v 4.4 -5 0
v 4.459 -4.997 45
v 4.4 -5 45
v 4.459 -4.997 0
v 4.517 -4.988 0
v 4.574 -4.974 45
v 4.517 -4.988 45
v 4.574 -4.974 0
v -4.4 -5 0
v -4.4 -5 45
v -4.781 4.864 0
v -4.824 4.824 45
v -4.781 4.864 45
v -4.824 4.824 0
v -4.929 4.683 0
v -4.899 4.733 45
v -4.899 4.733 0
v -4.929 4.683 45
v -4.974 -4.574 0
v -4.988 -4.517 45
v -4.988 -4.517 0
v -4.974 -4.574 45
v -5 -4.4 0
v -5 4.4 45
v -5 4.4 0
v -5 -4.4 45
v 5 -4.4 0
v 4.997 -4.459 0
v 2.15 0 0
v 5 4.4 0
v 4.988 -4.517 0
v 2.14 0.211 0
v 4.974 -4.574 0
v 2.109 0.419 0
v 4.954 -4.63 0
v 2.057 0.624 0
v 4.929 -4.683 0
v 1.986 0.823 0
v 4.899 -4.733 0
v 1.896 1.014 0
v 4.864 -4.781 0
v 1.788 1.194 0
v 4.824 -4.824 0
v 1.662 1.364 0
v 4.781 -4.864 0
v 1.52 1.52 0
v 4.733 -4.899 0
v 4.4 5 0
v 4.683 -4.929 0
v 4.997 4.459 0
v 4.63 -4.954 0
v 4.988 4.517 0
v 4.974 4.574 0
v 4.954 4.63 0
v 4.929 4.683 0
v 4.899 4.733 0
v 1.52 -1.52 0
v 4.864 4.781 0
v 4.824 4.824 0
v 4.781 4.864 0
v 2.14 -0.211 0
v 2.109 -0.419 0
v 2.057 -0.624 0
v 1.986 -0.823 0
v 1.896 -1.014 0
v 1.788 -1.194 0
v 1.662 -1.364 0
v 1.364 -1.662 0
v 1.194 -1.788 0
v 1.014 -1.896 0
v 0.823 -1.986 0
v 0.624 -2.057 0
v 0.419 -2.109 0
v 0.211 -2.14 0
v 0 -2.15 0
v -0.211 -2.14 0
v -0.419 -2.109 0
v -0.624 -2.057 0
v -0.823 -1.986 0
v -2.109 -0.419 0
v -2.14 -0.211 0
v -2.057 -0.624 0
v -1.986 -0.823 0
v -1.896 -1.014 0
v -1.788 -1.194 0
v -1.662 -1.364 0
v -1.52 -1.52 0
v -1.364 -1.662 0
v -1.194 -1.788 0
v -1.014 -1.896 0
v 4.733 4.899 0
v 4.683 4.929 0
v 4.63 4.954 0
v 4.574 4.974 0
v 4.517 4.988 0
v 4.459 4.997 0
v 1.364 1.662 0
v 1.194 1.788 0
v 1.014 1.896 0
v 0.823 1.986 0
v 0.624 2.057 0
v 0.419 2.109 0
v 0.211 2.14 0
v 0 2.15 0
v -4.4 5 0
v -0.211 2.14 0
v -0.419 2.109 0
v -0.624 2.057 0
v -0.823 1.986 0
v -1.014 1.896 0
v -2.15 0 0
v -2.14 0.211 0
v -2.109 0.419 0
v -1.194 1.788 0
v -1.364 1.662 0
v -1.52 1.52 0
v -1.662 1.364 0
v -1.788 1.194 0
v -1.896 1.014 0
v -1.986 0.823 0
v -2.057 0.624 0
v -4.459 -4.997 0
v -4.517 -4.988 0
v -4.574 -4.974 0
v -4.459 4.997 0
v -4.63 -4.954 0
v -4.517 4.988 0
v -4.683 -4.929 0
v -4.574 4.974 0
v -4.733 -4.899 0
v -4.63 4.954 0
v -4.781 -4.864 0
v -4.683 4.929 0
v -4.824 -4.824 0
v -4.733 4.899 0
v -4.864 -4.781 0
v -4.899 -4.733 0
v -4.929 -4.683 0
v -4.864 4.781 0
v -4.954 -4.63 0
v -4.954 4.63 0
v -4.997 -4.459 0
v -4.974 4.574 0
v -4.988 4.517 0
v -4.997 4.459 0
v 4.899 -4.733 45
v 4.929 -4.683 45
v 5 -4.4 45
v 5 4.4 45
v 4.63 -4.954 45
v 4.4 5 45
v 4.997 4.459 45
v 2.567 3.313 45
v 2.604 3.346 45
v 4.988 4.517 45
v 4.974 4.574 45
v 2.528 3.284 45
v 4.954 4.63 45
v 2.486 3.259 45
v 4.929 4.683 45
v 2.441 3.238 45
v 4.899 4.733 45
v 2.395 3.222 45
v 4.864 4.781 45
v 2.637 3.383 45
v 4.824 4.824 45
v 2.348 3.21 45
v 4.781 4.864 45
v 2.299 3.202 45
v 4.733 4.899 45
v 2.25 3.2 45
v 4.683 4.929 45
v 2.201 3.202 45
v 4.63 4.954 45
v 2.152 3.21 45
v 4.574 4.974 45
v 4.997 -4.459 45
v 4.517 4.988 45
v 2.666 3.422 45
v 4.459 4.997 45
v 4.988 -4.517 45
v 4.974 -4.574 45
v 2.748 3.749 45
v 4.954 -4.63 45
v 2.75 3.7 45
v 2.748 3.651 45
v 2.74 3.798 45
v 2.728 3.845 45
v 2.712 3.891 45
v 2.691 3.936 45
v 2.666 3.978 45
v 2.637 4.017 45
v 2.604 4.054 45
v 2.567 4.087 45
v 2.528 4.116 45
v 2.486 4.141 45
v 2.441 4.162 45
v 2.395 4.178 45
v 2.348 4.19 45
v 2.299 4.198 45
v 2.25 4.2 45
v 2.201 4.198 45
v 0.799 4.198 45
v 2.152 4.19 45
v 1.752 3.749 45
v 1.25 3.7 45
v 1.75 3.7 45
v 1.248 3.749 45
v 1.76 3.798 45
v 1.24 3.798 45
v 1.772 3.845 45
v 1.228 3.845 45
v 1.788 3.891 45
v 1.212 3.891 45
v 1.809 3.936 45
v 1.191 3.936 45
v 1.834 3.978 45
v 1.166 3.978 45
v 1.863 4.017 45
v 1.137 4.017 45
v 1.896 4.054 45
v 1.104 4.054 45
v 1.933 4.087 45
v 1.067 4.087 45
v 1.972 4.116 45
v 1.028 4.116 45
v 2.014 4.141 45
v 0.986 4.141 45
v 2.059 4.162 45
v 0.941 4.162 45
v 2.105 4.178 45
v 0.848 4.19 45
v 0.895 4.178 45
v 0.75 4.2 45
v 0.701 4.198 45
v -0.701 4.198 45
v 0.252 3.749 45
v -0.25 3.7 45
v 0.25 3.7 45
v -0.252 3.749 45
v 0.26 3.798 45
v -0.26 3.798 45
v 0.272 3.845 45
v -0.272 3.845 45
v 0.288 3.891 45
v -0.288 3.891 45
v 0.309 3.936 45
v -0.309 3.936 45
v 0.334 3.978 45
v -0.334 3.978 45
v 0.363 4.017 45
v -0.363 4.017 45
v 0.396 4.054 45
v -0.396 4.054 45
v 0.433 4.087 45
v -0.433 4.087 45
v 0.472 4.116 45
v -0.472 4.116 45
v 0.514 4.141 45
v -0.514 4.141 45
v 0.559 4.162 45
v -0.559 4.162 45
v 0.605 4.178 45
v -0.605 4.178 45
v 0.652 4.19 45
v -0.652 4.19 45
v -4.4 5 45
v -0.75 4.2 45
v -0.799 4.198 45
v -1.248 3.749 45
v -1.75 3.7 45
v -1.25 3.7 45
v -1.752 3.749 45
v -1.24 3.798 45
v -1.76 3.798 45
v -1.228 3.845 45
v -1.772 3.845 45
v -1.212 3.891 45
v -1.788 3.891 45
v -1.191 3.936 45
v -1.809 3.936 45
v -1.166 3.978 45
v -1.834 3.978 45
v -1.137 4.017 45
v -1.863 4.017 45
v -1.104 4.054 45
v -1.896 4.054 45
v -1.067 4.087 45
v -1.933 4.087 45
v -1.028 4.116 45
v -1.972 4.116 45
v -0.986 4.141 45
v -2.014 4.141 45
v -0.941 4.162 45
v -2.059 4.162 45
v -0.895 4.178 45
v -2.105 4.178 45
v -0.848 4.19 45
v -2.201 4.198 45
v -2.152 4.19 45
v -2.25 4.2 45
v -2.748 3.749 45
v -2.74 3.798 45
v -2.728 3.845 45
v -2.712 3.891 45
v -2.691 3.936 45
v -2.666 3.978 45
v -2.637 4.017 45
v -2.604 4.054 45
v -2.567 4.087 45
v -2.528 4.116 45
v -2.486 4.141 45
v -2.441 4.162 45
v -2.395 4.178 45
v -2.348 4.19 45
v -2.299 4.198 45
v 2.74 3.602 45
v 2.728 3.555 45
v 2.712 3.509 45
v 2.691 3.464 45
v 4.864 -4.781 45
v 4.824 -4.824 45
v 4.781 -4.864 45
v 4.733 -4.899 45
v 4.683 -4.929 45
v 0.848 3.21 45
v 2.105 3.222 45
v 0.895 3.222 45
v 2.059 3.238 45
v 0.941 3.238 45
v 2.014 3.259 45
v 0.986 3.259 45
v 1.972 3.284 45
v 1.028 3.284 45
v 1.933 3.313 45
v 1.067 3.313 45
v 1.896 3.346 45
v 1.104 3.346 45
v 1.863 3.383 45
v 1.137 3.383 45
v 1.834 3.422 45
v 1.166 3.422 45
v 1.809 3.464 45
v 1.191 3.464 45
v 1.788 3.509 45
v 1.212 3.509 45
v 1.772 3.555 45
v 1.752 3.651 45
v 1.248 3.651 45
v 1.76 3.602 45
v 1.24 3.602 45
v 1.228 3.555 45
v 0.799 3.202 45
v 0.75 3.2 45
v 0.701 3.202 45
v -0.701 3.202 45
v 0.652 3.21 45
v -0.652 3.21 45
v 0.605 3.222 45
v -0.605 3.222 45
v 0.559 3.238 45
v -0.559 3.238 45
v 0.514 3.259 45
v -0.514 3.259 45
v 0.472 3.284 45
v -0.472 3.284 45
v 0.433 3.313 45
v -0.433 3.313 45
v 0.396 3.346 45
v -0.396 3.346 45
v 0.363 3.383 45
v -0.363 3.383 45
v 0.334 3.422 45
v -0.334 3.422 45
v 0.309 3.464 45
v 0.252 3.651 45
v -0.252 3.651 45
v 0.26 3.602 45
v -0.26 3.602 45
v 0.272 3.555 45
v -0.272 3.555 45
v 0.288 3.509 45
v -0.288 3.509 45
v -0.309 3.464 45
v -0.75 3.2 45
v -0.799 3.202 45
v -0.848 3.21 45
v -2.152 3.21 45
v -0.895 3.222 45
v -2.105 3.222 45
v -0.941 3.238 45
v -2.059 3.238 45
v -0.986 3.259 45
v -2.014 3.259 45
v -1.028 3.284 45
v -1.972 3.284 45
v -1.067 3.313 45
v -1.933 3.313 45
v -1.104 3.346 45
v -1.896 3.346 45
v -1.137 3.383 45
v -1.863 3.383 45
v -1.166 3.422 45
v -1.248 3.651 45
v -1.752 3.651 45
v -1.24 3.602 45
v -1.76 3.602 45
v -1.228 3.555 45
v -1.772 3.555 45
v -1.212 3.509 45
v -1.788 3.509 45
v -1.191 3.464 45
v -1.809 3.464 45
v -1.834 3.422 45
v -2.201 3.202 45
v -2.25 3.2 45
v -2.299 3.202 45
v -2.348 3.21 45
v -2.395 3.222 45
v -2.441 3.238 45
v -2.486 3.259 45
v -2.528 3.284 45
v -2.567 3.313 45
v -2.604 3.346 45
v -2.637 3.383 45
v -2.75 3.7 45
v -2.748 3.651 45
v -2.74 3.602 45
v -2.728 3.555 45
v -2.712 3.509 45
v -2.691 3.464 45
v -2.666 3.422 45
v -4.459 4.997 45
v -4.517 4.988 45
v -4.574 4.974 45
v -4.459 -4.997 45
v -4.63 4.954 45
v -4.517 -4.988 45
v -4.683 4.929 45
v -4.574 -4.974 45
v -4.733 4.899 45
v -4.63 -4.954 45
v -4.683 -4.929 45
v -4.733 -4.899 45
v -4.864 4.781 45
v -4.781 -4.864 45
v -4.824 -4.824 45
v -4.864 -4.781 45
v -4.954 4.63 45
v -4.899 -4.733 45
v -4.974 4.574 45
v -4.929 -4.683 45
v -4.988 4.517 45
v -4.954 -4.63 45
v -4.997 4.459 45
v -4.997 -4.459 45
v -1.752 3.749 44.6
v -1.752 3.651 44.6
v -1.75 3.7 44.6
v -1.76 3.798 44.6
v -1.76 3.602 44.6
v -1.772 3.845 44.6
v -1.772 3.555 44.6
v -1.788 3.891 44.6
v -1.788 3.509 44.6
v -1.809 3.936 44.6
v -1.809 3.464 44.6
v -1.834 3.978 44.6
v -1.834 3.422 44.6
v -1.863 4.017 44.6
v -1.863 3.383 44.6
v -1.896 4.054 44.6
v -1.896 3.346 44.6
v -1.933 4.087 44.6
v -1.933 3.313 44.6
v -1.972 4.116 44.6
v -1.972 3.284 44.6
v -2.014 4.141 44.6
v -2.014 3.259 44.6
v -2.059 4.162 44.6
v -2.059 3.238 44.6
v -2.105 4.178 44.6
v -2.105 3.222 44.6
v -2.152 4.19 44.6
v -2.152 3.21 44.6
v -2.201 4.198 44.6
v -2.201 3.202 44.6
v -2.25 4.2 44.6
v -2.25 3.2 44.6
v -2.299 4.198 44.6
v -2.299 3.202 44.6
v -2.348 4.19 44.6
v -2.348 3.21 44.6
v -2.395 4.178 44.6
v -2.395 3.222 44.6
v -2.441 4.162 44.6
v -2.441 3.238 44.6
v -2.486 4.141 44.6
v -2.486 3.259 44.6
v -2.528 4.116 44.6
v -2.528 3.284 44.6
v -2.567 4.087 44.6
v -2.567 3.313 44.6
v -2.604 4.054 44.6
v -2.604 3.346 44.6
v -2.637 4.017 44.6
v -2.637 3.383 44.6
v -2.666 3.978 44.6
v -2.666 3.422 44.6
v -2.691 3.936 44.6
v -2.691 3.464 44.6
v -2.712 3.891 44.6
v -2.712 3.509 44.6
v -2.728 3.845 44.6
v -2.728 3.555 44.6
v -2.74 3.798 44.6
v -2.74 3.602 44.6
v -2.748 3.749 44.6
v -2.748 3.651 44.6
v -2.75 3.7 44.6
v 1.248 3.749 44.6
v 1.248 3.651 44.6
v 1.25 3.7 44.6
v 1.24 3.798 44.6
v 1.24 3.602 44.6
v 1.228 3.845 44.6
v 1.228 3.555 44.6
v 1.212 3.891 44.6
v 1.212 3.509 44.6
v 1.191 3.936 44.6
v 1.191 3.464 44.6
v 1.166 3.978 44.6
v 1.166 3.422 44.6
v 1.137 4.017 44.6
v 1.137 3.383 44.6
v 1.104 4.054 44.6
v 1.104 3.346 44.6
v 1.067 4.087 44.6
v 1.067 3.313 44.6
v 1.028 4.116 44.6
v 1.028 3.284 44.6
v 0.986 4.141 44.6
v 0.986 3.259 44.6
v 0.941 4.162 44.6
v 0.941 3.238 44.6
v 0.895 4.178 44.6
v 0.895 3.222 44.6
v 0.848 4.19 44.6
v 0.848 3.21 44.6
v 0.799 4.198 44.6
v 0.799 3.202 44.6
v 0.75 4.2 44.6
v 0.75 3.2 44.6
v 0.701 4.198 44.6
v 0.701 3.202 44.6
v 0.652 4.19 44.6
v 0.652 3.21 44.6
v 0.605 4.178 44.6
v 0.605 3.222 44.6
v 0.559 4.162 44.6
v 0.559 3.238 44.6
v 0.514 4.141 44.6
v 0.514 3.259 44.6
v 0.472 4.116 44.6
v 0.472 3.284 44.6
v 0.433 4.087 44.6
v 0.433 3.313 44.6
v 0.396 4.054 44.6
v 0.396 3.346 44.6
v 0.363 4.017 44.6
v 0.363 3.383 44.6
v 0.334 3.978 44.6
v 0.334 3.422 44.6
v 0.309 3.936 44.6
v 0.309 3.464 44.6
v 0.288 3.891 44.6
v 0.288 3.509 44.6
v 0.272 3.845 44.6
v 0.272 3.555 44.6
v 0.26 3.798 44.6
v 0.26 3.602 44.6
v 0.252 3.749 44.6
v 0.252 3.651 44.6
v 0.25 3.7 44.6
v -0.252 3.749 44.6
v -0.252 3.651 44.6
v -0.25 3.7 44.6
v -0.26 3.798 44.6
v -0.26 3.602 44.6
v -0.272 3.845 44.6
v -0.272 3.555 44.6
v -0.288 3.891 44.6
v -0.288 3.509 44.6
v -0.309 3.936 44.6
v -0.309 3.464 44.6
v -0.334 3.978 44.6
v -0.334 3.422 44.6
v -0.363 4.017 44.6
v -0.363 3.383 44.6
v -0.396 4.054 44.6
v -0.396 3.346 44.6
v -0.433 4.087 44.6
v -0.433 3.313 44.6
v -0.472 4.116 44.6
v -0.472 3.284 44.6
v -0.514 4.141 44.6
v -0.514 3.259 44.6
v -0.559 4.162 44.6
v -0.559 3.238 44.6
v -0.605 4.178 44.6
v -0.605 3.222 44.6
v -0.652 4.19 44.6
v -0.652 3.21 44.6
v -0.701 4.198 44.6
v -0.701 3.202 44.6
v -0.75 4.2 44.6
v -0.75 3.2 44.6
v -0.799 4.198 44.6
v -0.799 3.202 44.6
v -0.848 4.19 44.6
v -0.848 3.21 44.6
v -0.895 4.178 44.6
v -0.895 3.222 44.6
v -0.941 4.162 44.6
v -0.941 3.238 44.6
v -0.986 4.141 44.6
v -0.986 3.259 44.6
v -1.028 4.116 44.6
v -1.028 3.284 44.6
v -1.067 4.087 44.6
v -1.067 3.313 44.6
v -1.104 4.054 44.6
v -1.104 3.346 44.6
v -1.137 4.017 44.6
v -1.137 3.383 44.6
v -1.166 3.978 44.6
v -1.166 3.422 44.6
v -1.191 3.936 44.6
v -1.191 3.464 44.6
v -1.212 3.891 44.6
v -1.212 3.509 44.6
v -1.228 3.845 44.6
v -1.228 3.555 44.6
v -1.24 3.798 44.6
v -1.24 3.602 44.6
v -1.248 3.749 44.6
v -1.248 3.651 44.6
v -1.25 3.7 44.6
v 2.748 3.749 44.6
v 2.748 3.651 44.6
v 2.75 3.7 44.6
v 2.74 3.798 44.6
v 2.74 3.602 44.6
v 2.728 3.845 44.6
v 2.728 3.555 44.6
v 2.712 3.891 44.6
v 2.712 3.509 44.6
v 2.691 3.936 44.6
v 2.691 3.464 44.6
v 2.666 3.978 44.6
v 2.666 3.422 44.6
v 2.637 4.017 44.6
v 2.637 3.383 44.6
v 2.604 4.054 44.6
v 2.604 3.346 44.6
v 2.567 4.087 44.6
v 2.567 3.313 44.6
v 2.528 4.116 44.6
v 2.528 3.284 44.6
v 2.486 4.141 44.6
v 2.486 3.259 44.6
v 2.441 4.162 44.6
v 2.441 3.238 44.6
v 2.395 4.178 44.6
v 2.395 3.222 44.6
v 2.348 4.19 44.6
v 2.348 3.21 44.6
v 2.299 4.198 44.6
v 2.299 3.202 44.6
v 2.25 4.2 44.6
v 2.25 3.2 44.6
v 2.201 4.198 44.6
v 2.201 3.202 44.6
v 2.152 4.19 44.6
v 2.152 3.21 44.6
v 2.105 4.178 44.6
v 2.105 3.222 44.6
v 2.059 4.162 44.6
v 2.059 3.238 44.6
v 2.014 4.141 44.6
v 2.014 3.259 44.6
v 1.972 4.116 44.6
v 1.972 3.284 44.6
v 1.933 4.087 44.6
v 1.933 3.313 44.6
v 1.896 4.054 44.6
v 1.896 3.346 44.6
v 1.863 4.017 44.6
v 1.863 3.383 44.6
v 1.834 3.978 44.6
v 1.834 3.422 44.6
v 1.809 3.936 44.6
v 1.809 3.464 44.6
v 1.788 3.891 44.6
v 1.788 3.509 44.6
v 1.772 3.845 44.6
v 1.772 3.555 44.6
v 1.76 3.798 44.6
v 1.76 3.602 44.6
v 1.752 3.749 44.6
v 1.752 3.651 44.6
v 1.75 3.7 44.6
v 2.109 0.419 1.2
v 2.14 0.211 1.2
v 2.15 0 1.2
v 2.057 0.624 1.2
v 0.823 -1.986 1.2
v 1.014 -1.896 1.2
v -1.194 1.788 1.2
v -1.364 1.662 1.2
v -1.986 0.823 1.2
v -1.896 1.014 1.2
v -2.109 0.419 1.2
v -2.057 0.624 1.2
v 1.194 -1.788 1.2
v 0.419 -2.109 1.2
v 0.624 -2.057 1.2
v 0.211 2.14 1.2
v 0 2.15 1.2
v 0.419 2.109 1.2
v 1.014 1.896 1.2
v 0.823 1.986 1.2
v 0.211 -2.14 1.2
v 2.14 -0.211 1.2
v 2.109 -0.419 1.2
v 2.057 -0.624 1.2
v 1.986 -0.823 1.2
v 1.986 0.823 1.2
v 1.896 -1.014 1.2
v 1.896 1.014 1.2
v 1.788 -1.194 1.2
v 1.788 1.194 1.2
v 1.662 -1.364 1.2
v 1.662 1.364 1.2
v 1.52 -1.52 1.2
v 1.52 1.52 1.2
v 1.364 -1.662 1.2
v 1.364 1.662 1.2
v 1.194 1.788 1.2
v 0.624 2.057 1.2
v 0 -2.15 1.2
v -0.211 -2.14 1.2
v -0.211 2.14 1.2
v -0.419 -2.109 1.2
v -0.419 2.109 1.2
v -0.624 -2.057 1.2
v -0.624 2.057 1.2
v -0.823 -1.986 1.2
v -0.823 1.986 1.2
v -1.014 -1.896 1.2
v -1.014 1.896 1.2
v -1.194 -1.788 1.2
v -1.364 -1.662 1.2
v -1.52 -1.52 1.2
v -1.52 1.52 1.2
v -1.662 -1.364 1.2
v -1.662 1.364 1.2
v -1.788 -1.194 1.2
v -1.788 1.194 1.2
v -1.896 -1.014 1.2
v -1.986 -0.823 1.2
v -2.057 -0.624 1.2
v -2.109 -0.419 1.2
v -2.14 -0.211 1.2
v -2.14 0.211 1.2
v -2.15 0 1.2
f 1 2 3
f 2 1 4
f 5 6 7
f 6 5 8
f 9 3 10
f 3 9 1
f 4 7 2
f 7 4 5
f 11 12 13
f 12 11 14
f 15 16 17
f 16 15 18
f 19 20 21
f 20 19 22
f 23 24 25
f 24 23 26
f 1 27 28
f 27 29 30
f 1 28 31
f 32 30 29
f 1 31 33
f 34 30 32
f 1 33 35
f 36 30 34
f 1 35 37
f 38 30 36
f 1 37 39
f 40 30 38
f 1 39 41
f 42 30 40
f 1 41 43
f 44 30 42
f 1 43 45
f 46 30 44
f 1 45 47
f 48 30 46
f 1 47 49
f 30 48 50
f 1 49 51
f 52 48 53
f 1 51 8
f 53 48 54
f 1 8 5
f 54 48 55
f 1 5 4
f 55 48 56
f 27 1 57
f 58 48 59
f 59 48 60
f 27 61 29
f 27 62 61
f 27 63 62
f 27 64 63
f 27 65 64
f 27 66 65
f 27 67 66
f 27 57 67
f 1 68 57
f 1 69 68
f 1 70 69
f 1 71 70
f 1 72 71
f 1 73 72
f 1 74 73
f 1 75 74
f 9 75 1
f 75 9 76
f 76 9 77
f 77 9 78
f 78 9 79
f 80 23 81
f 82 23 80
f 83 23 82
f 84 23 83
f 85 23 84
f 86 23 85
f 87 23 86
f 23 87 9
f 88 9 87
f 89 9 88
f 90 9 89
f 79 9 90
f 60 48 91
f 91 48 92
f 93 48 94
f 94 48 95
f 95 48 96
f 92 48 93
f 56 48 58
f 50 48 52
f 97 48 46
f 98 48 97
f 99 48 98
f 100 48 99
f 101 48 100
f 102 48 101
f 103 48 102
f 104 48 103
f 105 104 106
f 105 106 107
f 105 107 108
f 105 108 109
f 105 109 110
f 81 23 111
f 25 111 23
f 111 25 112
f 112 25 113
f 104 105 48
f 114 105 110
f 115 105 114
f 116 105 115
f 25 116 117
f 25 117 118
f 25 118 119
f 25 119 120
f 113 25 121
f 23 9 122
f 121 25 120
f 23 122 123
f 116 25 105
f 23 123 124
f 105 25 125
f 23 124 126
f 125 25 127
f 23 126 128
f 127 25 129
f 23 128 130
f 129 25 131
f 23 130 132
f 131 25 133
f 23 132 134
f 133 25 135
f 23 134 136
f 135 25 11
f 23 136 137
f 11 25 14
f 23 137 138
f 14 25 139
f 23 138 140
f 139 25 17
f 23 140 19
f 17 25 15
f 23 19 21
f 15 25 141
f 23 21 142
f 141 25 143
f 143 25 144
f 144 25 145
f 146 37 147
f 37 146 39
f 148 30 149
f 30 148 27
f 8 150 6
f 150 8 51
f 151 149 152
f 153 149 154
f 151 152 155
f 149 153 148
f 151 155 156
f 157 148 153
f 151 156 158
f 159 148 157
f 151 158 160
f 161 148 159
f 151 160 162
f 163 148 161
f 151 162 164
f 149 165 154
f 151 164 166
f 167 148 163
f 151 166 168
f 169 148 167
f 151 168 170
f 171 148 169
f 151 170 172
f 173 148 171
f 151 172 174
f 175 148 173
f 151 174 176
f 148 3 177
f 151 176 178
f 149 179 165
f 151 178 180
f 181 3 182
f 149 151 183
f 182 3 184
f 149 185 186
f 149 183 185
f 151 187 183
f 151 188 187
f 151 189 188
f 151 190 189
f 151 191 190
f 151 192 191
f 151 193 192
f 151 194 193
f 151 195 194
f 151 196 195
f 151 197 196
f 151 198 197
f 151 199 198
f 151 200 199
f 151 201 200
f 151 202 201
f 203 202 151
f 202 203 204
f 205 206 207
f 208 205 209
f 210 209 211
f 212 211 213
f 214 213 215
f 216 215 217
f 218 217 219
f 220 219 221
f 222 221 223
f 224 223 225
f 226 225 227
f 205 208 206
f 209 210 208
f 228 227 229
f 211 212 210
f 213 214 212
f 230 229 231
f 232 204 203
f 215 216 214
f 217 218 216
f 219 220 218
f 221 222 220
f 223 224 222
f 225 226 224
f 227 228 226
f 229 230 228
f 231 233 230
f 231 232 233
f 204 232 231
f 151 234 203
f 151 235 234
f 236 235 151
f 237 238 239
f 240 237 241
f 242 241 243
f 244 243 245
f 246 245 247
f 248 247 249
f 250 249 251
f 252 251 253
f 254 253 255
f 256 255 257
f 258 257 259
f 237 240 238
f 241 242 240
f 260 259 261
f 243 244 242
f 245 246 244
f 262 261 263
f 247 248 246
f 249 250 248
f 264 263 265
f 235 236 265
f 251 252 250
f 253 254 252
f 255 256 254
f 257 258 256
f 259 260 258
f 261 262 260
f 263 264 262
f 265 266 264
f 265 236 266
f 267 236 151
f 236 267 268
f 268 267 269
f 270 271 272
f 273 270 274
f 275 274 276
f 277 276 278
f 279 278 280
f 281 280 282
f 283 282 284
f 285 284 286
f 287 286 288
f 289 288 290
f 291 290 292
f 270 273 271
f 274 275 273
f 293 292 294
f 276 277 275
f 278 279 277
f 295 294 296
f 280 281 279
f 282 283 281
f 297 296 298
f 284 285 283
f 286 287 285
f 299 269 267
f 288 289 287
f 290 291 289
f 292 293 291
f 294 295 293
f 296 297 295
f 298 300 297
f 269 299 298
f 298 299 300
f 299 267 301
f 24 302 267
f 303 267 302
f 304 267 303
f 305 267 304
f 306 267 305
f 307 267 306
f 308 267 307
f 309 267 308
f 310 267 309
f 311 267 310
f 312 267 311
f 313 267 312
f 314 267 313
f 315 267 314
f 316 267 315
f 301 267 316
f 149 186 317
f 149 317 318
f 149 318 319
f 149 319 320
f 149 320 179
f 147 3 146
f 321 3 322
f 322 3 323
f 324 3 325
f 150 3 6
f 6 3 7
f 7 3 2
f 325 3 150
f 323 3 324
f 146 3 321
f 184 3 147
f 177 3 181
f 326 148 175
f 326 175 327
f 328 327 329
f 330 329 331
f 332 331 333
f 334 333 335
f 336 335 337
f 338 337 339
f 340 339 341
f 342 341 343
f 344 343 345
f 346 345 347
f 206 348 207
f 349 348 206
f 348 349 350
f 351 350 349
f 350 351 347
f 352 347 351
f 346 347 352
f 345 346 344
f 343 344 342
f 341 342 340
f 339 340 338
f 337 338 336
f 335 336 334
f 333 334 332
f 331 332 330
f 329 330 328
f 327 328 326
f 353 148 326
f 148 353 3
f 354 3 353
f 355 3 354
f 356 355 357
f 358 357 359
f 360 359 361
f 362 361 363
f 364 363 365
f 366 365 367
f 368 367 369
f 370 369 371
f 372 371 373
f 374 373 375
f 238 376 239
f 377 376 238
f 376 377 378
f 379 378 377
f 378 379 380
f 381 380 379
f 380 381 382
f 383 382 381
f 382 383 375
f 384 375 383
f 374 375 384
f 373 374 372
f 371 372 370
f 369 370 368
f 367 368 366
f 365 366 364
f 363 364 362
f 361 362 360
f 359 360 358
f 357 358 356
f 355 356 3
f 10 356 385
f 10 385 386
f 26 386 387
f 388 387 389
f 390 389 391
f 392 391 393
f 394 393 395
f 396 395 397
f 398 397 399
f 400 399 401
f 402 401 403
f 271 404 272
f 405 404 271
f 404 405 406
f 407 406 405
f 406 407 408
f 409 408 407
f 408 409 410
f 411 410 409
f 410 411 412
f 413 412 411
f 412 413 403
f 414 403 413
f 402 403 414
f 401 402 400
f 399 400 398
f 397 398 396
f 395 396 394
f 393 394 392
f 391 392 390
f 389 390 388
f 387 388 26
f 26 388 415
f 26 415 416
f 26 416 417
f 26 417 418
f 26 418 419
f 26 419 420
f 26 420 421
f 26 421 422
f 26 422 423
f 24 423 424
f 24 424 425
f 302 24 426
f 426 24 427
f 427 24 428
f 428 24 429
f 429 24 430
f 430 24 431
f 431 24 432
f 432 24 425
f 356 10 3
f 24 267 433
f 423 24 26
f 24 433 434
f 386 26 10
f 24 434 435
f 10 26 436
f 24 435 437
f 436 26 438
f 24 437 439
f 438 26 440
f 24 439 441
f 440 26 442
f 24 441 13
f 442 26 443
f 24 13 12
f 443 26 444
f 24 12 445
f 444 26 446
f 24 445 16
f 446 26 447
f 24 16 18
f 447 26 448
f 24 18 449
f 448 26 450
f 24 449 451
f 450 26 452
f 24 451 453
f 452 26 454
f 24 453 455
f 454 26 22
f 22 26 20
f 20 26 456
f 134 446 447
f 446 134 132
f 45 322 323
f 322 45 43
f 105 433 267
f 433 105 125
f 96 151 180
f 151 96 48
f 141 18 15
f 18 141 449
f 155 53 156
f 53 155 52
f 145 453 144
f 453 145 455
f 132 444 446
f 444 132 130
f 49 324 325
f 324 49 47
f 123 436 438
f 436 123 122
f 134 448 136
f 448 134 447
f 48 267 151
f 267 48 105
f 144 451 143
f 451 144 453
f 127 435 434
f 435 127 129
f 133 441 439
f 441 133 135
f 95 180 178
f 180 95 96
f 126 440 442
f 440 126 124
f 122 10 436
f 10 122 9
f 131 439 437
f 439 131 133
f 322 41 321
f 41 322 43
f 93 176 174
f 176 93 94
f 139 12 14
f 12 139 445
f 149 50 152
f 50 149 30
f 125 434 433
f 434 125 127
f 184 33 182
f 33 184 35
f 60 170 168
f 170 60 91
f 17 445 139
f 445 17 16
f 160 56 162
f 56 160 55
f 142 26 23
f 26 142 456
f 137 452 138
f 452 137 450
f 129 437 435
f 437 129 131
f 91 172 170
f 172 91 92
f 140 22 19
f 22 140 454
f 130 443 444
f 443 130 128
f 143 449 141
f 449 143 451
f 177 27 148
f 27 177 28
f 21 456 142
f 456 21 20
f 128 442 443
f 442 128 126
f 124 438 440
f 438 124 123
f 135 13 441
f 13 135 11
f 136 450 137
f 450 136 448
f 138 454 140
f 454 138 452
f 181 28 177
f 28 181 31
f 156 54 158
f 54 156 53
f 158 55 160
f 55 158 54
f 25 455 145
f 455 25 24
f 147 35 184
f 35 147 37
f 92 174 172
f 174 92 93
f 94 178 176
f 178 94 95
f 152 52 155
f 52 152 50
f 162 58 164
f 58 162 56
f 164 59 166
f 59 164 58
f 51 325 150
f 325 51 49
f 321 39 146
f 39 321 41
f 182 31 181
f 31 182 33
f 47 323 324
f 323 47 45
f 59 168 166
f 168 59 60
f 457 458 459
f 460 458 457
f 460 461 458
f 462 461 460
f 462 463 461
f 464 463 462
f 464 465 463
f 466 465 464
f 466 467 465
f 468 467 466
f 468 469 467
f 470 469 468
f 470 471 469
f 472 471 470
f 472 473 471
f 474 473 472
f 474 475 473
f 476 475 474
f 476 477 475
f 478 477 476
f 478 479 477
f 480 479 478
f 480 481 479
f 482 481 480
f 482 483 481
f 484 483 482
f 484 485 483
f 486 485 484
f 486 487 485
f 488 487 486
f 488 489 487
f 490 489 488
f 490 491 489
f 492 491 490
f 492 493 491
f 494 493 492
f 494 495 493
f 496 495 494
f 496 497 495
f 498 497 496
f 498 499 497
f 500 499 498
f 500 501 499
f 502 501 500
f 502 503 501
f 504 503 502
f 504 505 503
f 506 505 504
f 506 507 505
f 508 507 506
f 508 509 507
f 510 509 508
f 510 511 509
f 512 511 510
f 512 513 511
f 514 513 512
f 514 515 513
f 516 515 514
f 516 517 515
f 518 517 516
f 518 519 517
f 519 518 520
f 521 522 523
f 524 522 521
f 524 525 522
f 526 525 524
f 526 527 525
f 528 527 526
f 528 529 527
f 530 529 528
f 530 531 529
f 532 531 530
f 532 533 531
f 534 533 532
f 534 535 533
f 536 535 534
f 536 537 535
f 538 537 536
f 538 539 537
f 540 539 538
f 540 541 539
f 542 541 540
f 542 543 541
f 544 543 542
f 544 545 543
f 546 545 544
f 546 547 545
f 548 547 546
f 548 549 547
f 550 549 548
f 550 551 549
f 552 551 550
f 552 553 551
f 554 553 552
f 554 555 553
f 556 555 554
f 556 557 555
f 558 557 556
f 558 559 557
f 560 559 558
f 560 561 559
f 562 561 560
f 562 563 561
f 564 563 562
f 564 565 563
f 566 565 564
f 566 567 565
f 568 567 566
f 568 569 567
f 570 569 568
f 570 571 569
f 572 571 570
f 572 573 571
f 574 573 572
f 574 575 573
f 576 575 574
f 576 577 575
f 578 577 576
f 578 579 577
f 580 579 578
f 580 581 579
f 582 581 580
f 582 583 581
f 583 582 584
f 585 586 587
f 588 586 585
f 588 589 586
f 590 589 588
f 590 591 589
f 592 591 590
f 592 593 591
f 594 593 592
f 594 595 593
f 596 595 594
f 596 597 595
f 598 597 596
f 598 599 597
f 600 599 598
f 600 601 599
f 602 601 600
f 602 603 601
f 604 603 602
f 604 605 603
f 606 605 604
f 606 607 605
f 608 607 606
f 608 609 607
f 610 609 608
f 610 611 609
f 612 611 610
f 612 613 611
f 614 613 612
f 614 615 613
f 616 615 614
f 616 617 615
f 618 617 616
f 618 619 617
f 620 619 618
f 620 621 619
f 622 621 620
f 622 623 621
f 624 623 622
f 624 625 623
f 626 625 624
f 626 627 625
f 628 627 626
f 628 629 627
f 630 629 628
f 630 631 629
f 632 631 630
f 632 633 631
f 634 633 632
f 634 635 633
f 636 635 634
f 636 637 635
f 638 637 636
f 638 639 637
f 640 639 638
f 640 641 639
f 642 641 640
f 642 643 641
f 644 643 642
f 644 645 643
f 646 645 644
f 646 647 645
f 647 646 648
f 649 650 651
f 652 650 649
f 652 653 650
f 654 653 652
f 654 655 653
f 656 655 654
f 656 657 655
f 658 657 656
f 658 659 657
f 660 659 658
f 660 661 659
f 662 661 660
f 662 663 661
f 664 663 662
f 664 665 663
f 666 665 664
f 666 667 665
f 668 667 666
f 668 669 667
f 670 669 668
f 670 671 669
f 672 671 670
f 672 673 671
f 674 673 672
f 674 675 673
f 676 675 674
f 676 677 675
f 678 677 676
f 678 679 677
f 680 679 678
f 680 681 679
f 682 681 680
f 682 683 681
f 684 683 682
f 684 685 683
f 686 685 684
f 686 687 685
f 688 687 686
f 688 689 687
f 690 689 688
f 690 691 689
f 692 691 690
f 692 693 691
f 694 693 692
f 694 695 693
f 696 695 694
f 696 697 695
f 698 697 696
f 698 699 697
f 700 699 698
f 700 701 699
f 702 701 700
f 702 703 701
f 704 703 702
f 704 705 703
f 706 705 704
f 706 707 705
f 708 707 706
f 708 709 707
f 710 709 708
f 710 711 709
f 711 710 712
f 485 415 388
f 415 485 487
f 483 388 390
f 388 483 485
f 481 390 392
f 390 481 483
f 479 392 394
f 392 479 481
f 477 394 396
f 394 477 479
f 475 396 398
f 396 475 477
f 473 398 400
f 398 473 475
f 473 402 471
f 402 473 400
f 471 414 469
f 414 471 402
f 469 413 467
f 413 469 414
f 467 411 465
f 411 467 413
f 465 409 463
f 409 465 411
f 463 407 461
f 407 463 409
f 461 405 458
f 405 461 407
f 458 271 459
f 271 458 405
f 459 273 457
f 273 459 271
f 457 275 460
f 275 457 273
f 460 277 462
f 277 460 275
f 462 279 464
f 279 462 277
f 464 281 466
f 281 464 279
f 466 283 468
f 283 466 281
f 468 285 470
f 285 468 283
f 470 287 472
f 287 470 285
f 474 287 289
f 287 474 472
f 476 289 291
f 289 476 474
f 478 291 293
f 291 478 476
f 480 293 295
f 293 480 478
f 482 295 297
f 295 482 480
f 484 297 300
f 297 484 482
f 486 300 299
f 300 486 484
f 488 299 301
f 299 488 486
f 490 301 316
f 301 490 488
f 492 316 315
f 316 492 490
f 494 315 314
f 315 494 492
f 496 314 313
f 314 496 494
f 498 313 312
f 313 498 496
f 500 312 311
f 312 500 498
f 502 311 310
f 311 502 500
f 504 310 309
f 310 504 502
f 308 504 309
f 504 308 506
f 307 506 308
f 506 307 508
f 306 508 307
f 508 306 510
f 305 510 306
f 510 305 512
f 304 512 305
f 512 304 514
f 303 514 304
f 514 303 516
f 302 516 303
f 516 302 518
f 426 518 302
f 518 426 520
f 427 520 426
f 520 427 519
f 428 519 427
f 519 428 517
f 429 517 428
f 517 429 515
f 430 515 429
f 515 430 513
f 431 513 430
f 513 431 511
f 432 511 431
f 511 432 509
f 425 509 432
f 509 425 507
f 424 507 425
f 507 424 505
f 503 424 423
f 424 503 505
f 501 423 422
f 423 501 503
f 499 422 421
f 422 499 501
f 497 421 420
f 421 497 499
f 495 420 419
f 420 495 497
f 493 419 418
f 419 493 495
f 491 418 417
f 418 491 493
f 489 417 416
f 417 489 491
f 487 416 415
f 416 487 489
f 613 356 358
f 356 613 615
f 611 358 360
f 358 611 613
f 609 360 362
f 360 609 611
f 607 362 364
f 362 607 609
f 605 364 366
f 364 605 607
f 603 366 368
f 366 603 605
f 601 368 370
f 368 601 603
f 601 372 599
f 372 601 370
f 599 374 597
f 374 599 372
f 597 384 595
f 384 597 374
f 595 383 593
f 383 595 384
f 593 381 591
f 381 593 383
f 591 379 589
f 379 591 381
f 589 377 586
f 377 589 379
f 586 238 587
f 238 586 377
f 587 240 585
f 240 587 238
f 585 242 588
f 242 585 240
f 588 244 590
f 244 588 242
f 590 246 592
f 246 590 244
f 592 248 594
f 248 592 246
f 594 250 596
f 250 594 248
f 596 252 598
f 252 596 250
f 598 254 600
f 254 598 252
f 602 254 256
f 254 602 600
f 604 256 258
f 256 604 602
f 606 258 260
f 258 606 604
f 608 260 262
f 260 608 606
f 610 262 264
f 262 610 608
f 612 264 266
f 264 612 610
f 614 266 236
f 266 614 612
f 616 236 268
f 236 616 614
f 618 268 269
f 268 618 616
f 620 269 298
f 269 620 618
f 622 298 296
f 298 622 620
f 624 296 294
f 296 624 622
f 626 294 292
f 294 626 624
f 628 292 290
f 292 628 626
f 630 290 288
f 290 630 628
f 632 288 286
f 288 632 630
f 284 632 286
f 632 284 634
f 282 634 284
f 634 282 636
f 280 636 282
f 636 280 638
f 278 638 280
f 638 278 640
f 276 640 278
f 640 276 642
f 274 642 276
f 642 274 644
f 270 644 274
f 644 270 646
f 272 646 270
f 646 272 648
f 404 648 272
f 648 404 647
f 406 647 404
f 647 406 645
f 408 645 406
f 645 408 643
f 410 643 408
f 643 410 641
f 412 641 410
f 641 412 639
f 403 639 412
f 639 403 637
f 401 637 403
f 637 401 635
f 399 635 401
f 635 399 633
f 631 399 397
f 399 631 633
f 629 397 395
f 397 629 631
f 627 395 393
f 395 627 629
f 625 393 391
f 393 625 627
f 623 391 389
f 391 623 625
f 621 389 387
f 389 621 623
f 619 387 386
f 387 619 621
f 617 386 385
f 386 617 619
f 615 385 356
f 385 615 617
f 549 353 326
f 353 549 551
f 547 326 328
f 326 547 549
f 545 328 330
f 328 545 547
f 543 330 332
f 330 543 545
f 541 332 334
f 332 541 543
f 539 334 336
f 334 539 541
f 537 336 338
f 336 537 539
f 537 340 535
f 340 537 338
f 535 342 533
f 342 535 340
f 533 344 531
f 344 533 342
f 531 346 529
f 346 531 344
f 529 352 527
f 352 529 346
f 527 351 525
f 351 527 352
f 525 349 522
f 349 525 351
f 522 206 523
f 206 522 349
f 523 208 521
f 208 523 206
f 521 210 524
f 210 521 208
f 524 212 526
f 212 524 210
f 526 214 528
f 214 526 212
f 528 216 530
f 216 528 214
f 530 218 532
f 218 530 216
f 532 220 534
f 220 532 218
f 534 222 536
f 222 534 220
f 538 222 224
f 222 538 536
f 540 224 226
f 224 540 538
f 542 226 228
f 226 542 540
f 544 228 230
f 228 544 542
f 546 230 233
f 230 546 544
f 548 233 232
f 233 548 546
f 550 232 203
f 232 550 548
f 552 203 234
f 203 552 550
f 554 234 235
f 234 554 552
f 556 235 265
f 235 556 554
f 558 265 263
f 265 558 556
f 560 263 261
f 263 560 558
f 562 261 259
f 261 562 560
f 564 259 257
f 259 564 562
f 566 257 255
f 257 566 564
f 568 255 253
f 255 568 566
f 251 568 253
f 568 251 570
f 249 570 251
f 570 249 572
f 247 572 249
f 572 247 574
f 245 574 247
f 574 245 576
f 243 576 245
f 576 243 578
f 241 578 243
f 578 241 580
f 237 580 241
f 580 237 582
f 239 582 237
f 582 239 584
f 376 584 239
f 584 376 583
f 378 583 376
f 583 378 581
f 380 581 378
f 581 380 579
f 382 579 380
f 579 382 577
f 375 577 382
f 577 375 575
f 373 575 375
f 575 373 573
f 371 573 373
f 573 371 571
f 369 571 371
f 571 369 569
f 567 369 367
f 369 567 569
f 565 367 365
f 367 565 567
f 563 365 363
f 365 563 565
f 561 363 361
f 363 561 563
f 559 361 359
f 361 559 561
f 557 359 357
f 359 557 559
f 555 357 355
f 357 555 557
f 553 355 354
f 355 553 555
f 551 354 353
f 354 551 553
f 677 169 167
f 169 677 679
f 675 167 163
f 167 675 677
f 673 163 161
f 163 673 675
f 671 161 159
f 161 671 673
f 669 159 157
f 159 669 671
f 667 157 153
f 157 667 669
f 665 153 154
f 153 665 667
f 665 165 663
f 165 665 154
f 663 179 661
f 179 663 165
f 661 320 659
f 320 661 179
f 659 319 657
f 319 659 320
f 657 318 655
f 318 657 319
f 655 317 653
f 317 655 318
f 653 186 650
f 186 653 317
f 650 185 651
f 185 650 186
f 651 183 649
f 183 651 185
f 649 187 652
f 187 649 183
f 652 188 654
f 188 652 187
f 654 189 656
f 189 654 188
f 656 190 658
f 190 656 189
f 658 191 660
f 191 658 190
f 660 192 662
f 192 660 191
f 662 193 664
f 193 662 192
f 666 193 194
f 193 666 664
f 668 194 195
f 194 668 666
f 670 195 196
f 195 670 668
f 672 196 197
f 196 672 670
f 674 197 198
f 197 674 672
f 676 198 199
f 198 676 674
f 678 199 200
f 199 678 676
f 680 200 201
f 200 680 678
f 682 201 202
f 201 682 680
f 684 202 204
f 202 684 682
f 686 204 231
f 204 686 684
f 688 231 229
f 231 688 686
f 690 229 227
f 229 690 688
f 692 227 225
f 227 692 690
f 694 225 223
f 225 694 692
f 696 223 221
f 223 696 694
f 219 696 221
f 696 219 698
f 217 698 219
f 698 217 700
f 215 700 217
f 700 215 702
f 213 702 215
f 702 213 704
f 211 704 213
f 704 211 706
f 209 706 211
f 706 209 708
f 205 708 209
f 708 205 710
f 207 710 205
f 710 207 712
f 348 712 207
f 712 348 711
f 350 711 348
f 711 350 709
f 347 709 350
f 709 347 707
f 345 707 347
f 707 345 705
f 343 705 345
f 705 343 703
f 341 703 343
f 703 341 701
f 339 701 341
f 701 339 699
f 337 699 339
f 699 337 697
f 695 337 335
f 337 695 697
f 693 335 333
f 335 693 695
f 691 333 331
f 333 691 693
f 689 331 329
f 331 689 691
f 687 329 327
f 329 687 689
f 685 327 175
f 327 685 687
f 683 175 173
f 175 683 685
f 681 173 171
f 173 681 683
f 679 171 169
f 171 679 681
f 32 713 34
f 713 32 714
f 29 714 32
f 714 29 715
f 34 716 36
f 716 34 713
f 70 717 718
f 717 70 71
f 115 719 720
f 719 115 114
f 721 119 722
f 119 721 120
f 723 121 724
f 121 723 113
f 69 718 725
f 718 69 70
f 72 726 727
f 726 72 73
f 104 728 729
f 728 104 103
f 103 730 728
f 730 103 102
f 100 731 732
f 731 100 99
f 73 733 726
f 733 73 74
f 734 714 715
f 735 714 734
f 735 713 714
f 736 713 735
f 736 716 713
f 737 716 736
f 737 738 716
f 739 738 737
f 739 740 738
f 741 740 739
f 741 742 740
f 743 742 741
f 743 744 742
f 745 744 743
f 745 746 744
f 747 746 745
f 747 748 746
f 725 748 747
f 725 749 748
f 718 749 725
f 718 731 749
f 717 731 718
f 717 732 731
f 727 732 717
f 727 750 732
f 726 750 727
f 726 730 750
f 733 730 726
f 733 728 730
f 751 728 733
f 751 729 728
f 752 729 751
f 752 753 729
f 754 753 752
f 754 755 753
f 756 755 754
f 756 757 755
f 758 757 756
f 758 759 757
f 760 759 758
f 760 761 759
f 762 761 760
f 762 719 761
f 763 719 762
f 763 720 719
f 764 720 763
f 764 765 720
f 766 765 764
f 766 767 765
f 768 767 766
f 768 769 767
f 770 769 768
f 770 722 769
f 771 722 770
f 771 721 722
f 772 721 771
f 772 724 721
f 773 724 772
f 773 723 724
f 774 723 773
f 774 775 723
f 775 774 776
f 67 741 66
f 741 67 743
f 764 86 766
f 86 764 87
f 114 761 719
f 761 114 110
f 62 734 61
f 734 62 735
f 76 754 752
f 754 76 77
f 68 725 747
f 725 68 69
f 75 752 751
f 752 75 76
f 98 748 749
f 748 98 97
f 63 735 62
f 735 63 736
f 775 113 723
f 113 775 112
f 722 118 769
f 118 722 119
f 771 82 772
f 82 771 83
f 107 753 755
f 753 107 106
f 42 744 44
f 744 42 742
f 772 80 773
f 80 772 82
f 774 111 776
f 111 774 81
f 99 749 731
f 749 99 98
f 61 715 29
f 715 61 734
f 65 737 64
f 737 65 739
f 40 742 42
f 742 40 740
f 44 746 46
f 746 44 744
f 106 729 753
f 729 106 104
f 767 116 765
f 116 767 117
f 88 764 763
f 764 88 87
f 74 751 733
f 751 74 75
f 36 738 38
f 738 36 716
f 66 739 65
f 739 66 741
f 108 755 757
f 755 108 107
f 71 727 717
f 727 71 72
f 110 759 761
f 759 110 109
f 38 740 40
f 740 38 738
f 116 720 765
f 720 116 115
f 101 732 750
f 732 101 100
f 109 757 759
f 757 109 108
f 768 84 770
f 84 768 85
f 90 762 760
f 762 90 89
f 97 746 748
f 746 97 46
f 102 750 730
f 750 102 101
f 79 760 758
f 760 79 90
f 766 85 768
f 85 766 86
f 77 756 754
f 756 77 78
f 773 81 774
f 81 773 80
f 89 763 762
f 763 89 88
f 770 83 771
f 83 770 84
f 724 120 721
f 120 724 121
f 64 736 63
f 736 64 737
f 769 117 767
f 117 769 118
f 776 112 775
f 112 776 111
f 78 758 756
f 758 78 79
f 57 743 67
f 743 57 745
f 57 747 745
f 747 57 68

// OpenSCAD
// hallway / coat_rack — a slim, tall coat stand (hall tree) token, with a row
// of pegs engraved near one edge and nothing else.
//
// Width/Depth are the real-world footprint in cm: a coat stand's base is slim,
// 40 x 40 cm here — just enough to keep a tall piece from tipping. Height is its
// real height — the hooks have to be reachable above a hanging coat — shrunk by the
// plan scale like the footprint (see printed_h() in lib/common.scad): a slim piece
// standing as tall as the wardrobes.

include <../lib/common.scad>

Width  = 40;   // cm
Depth  = 40;   // cm
Height = 180;  // cm — up at hook height

// the printed height, mm: Height at the plan scale
Print_h = printed_h(Height);

Show_pegs = true;
// Magnet pockets in the bottom face (0 = none). A 40 cm side is 10 mm
// across at 1:40 — wide enough for a 4 mm disc.
Magnets = 1;

// The peg row, printed mm — a simplified plan-view symbol for the hooks near
// the top of the stand, drawn as small filled dots near one edge instead of
// with stroke_line()/stroke_arc(): a hook this small would close up at one
// nozzle width, a dot still reads.
Peg_count = 4;    // dots in the row — 3-4 reads as pegs, more looks like a seam
Peg_d     = 1;    // dot diameter
Peg_gap   = 0.5;  // gap between dots

coat_rack();

module coat_rack() {
    difference() {
        footprint(Width, Depth, Print_h);
        // the pegs sit near one edge, as a real coat stand's hooks would
        if (Show_pegs)
            pegs(Print_h);
        if (Magnets > 0)
            magnets(Width, Depth, Magnets);
    }
}

// The peg row cut into the top face, near the +Y edge — the custom-pictogram
// pattern from lib/common.scad's header: a shallow cut at the same depth as
// label(), centred on the origin, built from plain circles.
module pegs(top_z, depth = Label_depth, n = Peg_count, d = Peg_d, gap = Peg_gap) {
    step  = d + gap;
    row_y = cm(Depth) / 2 - Symbol_margin - d / 2;
    translate([0, 0, top_z - depth])
        linear_extrude(height = depth + 0.01)
            for (i = [0 : n - 1])
                translate([-(n - 1) * step / 2 + i * step, row_y])
                    circle(d = d);
}
